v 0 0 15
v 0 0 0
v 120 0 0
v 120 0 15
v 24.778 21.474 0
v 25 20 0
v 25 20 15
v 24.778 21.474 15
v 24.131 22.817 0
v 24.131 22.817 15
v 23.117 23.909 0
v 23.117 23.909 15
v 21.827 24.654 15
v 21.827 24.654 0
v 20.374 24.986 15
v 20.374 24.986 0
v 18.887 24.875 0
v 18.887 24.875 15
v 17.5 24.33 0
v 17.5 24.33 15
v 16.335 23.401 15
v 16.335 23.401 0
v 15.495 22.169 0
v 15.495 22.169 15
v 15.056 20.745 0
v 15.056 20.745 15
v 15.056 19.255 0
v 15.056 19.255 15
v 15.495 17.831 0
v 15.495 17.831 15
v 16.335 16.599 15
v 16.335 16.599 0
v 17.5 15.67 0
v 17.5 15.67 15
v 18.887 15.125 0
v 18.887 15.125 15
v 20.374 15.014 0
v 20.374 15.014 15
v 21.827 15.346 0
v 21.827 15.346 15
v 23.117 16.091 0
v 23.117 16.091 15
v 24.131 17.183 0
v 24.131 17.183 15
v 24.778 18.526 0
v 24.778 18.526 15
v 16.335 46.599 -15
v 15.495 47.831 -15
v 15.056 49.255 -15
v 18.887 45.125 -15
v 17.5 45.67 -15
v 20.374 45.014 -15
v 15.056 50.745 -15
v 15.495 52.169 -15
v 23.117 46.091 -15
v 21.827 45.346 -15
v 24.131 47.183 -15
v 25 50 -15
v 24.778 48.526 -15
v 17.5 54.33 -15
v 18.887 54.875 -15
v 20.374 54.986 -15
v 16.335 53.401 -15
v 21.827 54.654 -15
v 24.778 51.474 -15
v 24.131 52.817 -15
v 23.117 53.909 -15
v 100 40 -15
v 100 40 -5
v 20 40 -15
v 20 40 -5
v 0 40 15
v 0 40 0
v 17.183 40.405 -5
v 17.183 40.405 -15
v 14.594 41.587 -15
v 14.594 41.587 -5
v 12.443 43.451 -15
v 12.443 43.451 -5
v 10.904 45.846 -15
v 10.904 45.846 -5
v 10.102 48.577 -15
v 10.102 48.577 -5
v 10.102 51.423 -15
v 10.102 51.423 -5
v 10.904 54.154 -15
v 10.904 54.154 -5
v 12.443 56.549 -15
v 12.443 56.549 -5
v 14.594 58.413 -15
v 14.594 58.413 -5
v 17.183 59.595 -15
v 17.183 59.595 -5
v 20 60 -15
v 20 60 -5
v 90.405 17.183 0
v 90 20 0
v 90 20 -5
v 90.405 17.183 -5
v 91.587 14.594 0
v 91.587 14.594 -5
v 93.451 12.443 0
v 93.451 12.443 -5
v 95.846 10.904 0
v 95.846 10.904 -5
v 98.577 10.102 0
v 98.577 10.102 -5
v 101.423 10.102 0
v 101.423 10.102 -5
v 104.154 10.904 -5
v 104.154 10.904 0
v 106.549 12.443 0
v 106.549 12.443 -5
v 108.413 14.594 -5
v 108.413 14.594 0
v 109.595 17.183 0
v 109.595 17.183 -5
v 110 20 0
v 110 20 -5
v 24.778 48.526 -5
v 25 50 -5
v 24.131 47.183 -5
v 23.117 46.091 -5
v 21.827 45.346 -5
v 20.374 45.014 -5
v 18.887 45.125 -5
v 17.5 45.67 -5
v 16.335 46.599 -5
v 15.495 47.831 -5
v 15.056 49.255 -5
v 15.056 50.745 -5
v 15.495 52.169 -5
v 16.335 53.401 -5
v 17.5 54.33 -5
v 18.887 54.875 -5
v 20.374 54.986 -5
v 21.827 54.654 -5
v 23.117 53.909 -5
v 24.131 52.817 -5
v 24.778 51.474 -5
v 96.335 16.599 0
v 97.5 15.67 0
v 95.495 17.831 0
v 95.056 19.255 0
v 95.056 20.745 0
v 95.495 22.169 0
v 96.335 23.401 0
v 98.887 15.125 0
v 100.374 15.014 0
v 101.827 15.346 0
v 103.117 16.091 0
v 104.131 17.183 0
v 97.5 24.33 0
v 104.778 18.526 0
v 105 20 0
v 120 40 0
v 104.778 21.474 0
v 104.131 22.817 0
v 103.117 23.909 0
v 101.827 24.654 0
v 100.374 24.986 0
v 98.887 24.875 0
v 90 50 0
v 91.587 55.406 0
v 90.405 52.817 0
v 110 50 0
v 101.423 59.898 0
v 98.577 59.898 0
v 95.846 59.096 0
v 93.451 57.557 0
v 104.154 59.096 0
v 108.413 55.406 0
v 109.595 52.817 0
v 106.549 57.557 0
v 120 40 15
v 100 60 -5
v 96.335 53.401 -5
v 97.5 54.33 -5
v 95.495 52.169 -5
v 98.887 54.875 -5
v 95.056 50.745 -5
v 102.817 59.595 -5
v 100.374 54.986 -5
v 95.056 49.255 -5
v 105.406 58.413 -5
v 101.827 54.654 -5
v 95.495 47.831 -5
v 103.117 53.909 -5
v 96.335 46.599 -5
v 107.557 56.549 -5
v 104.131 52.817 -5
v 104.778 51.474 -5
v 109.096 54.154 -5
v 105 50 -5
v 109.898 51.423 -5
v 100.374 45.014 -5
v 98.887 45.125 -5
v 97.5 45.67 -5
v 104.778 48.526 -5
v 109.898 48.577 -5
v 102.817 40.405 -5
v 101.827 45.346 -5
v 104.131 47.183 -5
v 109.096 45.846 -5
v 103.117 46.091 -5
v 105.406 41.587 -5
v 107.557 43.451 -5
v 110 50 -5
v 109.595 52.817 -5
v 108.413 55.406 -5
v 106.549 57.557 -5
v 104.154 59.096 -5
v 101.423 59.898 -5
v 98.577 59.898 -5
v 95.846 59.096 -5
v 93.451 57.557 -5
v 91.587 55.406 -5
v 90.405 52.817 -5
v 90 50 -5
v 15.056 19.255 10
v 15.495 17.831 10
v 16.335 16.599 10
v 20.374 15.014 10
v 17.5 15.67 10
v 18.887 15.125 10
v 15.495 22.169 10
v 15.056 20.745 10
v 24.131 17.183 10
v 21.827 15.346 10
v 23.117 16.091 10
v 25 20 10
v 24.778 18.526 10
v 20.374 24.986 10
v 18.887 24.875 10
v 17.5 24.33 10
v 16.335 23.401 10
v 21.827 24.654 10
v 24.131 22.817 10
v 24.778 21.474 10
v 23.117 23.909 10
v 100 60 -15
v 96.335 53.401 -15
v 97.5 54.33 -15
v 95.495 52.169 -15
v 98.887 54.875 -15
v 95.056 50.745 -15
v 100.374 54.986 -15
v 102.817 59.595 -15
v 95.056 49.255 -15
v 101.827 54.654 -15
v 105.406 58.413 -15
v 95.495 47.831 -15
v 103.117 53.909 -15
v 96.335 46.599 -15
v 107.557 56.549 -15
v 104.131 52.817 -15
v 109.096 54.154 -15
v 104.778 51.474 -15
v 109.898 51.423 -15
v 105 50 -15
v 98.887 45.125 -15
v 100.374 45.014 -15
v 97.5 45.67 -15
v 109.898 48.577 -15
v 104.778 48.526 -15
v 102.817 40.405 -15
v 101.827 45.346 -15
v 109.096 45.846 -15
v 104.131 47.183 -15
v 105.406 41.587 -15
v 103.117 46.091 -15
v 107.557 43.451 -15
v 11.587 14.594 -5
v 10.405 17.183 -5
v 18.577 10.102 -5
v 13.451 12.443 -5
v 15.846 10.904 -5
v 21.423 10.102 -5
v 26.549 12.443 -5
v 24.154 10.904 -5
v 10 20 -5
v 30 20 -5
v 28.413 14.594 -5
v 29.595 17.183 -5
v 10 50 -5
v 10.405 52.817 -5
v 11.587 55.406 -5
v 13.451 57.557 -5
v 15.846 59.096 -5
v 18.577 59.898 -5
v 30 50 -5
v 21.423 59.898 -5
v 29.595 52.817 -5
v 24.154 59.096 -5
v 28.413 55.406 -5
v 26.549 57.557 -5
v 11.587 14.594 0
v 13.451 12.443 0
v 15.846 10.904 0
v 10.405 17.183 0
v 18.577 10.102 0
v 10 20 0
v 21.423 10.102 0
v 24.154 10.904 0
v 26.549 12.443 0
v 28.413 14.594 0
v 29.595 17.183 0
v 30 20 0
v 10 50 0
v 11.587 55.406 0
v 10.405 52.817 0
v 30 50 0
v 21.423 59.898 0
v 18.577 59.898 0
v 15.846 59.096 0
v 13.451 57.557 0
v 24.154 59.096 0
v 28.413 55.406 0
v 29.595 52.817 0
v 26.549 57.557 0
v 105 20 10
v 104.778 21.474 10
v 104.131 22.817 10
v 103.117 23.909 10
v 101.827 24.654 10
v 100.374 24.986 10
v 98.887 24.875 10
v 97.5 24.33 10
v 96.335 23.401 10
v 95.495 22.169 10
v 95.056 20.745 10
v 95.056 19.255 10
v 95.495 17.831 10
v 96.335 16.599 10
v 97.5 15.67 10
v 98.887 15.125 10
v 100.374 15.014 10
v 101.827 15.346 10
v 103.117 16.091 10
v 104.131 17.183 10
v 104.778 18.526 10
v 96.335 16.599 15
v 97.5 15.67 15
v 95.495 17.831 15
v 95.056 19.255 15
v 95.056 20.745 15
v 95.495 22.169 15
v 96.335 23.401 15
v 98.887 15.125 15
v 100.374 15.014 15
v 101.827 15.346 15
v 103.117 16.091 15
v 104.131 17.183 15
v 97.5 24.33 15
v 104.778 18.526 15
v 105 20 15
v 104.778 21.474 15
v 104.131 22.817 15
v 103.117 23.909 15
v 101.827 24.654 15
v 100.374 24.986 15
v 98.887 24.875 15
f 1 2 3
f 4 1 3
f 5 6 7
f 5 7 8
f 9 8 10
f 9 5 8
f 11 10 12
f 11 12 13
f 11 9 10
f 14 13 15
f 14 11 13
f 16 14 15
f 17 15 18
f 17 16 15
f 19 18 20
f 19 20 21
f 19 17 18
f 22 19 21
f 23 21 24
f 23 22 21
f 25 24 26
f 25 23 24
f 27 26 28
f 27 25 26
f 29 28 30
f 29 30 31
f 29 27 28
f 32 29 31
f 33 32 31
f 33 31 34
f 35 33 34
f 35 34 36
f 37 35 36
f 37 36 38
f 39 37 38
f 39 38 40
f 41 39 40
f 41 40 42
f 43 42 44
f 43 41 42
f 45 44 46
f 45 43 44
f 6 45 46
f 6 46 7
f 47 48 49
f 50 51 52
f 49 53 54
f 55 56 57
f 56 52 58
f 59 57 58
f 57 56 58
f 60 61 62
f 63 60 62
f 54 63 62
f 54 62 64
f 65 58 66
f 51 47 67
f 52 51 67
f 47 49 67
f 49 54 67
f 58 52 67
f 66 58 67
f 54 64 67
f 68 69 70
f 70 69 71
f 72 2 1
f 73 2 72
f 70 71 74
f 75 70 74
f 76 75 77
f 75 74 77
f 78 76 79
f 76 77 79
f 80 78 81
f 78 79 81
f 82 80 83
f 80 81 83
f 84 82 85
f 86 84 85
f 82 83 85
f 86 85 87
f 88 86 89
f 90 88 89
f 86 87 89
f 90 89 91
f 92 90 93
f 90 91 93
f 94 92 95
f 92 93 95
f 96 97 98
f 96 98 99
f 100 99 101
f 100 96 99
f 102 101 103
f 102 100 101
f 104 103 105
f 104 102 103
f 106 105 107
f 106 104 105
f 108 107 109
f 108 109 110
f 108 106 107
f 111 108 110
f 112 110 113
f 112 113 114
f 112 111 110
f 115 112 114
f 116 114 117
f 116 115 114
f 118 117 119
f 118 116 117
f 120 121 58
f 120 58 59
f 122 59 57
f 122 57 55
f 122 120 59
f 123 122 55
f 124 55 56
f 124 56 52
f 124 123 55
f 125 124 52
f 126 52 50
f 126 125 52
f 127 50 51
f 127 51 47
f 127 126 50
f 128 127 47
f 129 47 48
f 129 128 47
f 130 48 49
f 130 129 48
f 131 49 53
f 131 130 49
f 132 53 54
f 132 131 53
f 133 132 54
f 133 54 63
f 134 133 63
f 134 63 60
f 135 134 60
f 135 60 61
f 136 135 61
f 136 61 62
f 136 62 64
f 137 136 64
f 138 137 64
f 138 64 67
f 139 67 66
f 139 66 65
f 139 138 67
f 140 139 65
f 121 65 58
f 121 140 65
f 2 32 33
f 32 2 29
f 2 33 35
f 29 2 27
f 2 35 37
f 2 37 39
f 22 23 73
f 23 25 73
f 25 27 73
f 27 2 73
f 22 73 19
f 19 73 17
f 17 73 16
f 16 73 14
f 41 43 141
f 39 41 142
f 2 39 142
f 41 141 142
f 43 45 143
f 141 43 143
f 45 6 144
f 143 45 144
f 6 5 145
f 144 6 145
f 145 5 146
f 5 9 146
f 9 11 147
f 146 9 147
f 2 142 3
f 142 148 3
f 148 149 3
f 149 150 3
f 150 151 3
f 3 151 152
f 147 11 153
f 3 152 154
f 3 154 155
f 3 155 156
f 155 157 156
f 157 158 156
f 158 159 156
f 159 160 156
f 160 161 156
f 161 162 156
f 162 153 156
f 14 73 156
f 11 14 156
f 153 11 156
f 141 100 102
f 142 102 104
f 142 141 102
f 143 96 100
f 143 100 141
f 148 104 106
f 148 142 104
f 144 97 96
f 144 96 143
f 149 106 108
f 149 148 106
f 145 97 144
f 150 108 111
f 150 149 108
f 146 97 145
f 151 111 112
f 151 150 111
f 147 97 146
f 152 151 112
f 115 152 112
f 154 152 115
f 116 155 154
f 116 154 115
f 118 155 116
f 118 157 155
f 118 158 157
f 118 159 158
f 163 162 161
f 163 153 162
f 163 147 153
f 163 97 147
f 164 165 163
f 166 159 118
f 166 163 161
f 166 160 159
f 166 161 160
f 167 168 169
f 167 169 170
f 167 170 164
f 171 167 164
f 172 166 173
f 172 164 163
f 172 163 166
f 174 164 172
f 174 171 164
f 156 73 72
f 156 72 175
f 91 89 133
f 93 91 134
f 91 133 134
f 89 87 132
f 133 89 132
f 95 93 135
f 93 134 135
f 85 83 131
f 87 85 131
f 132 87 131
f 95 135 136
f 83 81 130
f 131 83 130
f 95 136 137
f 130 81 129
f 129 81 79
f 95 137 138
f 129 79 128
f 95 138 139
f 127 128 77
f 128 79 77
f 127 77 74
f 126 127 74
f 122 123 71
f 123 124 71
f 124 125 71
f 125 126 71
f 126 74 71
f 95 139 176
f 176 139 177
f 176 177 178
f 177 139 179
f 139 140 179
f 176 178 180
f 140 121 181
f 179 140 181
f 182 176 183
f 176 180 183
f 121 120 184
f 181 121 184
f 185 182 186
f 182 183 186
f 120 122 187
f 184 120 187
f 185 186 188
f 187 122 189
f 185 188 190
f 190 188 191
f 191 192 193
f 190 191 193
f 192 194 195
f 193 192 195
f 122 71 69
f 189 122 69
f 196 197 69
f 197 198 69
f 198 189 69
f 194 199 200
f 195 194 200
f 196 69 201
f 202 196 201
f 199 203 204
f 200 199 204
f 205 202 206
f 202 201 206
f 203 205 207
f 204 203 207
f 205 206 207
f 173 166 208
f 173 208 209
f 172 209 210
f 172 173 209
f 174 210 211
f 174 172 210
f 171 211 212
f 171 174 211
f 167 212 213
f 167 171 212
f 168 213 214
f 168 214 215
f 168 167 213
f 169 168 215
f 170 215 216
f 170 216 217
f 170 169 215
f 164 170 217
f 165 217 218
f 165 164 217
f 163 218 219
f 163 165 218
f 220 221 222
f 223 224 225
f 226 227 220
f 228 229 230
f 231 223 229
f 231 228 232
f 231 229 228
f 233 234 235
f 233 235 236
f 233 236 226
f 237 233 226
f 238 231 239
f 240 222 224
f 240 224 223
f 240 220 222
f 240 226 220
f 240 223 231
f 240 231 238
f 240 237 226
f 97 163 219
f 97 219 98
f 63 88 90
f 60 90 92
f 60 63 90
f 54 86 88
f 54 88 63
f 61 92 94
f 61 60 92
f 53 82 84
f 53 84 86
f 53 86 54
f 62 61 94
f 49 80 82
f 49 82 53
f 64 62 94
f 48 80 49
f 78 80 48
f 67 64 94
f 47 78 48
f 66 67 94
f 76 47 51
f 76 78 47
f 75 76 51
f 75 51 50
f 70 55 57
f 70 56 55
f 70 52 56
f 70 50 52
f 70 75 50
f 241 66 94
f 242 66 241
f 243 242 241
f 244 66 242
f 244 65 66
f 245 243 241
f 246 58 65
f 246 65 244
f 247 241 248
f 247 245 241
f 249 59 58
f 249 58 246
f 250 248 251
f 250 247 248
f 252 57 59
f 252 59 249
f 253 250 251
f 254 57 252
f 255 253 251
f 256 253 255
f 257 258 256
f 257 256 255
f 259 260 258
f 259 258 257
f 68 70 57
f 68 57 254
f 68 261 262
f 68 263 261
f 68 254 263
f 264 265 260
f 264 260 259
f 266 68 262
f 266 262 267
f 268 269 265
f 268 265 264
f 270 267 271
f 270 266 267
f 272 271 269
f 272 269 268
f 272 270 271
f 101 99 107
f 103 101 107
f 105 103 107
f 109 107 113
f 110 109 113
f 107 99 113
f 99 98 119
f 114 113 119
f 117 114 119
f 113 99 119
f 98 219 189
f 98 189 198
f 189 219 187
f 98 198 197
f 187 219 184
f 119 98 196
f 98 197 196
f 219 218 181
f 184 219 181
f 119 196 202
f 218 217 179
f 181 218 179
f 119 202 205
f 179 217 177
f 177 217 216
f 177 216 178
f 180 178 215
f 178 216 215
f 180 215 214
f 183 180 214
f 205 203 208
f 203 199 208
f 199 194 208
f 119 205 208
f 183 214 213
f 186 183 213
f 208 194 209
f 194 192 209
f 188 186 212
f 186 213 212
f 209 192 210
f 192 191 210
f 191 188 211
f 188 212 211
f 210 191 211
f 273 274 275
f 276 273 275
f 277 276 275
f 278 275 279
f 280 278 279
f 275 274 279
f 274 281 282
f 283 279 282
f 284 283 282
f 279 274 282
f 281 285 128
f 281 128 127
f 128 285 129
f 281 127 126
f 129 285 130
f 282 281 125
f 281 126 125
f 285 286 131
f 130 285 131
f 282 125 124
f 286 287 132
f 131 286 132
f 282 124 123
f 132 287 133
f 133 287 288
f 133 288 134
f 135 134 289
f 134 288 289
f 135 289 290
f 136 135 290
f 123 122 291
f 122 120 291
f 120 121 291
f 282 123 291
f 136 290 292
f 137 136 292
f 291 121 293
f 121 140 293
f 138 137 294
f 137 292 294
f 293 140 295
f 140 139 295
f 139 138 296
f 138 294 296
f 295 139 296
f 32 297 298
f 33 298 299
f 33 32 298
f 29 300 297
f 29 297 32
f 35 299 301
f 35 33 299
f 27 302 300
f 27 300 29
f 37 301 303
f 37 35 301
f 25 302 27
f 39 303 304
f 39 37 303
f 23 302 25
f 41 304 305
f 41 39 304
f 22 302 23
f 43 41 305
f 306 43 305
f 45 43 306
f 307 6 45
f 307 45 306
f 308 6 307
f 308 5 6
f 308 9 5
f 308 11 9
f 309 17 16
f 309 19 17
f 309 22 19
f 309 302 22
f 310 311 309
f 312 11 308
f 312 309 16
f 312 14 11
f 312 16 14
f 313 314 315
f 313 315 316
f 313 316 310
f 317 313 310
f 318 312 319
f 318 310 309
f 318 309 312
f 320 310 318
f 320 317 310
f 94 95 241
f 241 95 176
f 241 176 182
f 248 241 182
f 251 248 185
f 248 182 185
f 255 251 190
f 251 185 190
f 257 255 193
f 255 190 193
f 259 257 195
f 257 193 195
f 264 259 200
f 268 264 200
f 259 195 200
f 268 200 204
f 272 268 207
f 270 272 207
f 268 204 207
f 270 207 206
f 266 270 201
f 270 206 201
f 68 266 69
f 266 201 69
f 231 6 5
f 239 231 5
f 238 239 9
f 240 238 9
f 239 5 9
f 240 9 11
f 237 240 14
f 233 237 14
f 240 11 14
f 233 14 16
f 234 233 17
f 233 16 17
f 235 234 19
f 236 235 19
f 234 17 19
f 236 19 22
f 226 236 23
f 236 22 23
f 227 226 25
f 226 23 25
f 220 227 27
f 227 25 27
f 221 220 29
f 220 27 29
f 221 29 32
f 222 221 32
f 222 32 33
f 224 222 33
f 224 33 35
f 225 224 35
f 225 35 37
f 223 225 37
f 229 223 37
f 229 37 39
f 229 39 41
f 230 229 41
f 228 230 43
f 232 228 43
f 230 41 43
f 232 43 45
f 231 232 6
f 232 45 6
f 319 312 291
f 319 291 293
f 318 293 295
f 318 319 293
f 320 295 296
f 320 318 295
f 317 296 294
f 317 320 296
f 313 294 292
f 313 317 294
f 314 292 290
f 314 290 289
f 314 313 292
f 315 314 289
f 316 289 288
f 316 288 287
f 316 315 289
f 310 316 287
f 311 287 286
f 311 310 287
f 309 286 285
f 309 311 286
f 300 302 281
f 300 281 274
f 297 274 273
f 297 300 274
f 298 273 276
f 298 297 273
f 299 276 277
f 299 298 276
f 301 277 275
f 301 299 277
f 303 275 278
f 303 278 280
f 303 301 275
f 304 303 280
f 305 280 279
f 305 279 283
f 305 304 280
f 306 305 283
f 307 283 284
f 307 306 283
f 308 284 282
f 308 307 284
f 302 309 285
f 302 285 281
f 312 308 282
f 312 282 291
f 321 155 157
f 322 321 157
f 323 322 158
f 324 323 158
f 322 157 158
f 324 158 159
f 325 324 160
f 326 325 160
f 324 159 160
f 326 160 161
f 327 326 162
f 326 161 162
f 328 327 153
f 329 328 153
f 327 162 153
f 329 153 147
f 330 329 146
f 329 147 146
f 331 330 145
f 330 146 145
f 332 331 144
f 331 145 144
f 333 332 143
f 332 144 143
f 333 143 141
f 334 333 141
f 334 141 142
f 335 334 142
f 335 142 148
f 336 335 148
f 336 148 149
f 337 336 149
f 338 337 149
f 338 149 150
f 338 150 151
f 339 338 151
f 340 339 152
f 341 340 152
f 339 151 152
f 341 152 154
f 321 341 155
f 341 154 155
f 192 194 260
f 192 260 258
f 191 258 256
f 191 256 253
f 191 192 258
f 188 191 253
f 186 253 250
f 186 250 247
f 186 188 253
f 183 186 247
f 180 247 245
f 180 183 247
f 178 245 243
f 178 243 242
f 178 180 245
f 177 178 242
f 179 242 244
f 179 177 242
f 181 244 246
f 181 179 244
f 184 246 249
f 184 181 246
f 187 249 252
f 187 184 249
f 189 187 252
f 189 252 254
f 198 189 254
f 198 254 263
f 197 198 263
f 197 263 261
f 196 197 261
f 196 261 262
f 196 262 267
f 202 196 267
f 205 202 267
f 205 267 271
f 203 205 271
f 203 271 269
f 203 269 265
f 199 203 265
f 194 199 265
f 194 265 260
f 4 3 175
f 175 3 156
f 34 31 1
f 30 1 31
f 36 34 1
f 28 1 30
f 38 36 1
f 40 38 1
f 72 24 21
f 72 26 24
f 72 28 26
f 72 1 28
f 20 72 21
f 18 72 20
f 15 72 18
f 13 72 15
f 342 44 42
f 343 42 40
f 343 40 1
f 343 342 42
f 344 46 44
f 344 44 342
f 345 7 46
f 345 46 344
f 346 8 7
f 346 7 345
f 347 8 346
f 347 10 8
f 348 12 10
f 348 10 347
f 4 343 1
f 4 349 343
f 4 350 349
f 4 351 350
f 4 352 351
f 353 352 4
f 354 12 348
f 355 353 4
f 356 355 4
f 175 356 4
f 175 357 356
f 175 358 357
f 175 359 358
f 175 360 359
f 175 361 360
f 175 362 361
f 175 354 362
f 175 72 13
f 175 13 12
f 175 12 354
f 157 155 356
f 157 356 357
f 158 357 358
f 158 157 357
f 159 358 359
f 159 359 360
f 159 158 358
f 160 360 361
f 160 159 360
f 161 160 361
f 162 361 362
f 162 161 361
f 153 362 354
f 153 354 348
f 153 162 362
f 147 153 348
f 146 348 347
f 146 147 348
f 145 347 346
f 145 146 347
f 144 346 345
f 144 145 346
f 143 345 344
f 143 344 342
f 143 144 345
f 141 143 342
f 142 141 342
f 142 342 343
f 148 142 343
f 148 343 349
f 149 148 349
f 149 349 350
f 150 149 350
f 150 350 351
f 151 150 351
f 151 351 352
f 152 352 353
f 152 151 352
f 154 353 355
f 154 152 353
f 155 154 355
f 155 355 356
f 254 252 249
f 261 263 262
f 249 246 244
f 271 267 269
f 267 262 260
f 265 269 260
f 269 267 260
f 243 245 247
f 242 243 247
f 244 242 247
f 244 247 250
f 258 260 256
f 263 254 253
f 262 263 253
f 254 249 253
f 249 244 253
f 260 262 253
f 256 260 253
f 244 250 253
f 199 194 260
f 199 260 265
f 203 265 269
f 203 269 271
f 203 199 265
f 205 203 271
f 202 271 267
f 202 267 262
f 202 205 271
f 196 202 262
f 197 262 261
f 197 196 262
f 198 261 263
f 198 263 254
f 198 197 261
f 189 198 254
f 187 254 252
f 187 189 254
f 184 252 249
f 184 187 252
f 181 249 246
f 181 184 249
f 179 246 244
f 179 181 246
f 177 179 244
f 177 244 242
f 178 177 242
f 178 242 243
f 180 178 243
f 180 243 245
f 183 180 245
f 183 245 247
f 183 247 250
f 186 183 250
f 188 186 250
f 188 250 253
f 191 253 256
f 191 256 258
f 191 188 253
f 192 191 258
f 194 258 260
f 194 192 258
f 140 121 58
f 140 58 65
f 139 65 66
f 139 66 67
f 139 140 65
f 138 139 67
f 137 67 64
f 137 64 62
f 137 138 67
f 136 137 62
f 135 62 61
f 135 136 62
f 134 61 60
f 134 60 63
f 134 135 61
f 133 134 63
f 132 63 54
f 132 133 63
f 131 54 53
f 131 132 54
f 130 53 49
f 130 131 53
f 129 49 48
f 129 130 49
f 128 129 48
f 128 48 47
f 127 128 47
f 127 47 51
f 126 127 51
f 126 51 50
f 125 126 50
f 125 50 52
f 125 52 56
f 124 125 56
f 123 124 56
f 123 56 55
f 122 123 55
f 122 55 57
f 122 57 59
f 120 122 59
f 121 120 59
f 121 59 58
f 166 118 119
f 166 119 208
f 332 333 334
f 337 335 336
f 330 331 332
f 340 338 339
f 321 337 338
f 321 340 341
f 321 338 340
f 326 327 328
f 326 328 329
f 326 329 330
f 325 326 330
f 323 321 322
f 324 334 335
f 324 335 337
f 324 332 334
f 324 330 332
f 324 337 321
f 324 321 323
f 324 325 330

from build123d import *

# Parameters (mm, degrees)
F0_W          = 120
F0_H          = 40
F0_R          = 5
F1_DEPTH      = 15
F2_R          = 5
F3_DEPTH      = 5
F4_DEPTH      = 10
F4_DEPTH_BACK = 5
F5_DEPTH      = 10
F5_DEPTH_BACK = 5
F6_DEPTH      = 15
F7_DEPTH      = 15
F9_R          = 5
F10_DEPTH     = 10


with BuildPart() as f1:
    # F0 (on Top) → F1 (new body)
    with BuildSketch(Plane.XY):
        with Locations((60, 20)):
            Rectangle(F0_W, F0_H)
        with Locations((20, 20)):
            Circle(F0_R, mode=Mode.SUBTRACT)
        with Locations((100, 20)):
            Circle(F0_R, mode=Mode.SUBTRACT)
    extrude(amount=F1_DEPTH)


with BuildPart() as f3:
    # F2 (on Top) → F3 (new body)
    with BuildSketch(Plane.XY):
        with BuildLine():
            Line((10, 50), (10, 20))
            ThreePointArc((10, 20), (20, 10), (30, 20))
            Line((30, 20), (30, 50))
            ThreePointArc((30, 50), (20, 60), (10, 50))
        make_face()
        with Locations((20, 20)):
            Circle(F2_R, mode=Mode.SUBTRACT)
        with Locations((20, 50)):
            Circle(F2_R, mode=Mode.SUBTRACT)
    extrude(amount=-F3_DEPTH)

    # F2 (on Top) → F4 (join, two sides)
    with BuildSketch(Plane.XY) as f4_sk:
        with Locations((20, 20)):
            Circle(F2_R)
    extrude(amount=F4_DEPTH)
    extrude(f4_sk.sketch, amount=-F4_DEPTH_BACK)

    # F2 (on Top) → F6 (join)
    with BuildSketch(Plane.XY):
        with Locations((20, 50)):
            Circle(F2_R)
    extrude(amount=-F6_DEPTH)


with BuildPart() as f3b:
    # F2 (on Top) → F3, piece 2 (new body)
    with BuildSketch(Plane.XY):
        with BuildLine():
            Line((90, 50), (90, 20))
            ThreePointArc((90, 20), (100, 10), (110, 20))
            Line((110, 20), (110, 50))
            ThreePointArc((110, 50), (100, 60), (90, 50))
        make_face()
        with Locations((100, 20)):
            Circle(F2_R, mode=Mode.SUBTRACT)
        with Locations((100, 50)):
            Circle(F2_R, mode=Mode.SUBTRACT)
    extrude(amount=-F3_DEPTH)

    # F2 (on Top) → F5 (join, two sides)
    with BuildSketch(Plane.XY) as f5_sk:
        with Locations((100, 20)):
            Circle(F2_R)
    extrude(amount=F5_DEPTH)
    extrude(f5_sk.sketch, amount=-F5_DEPTH_BACK)

    # F2 (on Top) → F7 (join)
    with BuildSketch(Plane.XY):
        with Locations((100, 50)):
            Circle(F2_R)
    extrude(amount=-F7_DEPTH)


with BuildPart() as f10:
    # F9 (on offset) → F10 (new body)
    with BuildSketch(Plane(origin=(0, 0, -5), x_dir=(1, 0, 0), z_dir=(0, 0, -1))):
        with BuildLine():
            ThreePointArc((100, -60), (110, -50), (100, -40))
            Line((100, -40), (20, -40))
            ThreePointArc((20, -40), (10, -50), (20, -60))
            Line((20, -60), (100, -60))
        make_face()
        with Locations((20, -50)):
            Circle(F9_R, mode=Mode.SUBTRACT)
        with Locations((100, -50)):
            Circle(F9_R, mode=Mode.SUBTRACT)
    extrude(amount=F10_DEPTH)


solid = Compound([f1.part, f3.part, f3b.part, f10.part])
